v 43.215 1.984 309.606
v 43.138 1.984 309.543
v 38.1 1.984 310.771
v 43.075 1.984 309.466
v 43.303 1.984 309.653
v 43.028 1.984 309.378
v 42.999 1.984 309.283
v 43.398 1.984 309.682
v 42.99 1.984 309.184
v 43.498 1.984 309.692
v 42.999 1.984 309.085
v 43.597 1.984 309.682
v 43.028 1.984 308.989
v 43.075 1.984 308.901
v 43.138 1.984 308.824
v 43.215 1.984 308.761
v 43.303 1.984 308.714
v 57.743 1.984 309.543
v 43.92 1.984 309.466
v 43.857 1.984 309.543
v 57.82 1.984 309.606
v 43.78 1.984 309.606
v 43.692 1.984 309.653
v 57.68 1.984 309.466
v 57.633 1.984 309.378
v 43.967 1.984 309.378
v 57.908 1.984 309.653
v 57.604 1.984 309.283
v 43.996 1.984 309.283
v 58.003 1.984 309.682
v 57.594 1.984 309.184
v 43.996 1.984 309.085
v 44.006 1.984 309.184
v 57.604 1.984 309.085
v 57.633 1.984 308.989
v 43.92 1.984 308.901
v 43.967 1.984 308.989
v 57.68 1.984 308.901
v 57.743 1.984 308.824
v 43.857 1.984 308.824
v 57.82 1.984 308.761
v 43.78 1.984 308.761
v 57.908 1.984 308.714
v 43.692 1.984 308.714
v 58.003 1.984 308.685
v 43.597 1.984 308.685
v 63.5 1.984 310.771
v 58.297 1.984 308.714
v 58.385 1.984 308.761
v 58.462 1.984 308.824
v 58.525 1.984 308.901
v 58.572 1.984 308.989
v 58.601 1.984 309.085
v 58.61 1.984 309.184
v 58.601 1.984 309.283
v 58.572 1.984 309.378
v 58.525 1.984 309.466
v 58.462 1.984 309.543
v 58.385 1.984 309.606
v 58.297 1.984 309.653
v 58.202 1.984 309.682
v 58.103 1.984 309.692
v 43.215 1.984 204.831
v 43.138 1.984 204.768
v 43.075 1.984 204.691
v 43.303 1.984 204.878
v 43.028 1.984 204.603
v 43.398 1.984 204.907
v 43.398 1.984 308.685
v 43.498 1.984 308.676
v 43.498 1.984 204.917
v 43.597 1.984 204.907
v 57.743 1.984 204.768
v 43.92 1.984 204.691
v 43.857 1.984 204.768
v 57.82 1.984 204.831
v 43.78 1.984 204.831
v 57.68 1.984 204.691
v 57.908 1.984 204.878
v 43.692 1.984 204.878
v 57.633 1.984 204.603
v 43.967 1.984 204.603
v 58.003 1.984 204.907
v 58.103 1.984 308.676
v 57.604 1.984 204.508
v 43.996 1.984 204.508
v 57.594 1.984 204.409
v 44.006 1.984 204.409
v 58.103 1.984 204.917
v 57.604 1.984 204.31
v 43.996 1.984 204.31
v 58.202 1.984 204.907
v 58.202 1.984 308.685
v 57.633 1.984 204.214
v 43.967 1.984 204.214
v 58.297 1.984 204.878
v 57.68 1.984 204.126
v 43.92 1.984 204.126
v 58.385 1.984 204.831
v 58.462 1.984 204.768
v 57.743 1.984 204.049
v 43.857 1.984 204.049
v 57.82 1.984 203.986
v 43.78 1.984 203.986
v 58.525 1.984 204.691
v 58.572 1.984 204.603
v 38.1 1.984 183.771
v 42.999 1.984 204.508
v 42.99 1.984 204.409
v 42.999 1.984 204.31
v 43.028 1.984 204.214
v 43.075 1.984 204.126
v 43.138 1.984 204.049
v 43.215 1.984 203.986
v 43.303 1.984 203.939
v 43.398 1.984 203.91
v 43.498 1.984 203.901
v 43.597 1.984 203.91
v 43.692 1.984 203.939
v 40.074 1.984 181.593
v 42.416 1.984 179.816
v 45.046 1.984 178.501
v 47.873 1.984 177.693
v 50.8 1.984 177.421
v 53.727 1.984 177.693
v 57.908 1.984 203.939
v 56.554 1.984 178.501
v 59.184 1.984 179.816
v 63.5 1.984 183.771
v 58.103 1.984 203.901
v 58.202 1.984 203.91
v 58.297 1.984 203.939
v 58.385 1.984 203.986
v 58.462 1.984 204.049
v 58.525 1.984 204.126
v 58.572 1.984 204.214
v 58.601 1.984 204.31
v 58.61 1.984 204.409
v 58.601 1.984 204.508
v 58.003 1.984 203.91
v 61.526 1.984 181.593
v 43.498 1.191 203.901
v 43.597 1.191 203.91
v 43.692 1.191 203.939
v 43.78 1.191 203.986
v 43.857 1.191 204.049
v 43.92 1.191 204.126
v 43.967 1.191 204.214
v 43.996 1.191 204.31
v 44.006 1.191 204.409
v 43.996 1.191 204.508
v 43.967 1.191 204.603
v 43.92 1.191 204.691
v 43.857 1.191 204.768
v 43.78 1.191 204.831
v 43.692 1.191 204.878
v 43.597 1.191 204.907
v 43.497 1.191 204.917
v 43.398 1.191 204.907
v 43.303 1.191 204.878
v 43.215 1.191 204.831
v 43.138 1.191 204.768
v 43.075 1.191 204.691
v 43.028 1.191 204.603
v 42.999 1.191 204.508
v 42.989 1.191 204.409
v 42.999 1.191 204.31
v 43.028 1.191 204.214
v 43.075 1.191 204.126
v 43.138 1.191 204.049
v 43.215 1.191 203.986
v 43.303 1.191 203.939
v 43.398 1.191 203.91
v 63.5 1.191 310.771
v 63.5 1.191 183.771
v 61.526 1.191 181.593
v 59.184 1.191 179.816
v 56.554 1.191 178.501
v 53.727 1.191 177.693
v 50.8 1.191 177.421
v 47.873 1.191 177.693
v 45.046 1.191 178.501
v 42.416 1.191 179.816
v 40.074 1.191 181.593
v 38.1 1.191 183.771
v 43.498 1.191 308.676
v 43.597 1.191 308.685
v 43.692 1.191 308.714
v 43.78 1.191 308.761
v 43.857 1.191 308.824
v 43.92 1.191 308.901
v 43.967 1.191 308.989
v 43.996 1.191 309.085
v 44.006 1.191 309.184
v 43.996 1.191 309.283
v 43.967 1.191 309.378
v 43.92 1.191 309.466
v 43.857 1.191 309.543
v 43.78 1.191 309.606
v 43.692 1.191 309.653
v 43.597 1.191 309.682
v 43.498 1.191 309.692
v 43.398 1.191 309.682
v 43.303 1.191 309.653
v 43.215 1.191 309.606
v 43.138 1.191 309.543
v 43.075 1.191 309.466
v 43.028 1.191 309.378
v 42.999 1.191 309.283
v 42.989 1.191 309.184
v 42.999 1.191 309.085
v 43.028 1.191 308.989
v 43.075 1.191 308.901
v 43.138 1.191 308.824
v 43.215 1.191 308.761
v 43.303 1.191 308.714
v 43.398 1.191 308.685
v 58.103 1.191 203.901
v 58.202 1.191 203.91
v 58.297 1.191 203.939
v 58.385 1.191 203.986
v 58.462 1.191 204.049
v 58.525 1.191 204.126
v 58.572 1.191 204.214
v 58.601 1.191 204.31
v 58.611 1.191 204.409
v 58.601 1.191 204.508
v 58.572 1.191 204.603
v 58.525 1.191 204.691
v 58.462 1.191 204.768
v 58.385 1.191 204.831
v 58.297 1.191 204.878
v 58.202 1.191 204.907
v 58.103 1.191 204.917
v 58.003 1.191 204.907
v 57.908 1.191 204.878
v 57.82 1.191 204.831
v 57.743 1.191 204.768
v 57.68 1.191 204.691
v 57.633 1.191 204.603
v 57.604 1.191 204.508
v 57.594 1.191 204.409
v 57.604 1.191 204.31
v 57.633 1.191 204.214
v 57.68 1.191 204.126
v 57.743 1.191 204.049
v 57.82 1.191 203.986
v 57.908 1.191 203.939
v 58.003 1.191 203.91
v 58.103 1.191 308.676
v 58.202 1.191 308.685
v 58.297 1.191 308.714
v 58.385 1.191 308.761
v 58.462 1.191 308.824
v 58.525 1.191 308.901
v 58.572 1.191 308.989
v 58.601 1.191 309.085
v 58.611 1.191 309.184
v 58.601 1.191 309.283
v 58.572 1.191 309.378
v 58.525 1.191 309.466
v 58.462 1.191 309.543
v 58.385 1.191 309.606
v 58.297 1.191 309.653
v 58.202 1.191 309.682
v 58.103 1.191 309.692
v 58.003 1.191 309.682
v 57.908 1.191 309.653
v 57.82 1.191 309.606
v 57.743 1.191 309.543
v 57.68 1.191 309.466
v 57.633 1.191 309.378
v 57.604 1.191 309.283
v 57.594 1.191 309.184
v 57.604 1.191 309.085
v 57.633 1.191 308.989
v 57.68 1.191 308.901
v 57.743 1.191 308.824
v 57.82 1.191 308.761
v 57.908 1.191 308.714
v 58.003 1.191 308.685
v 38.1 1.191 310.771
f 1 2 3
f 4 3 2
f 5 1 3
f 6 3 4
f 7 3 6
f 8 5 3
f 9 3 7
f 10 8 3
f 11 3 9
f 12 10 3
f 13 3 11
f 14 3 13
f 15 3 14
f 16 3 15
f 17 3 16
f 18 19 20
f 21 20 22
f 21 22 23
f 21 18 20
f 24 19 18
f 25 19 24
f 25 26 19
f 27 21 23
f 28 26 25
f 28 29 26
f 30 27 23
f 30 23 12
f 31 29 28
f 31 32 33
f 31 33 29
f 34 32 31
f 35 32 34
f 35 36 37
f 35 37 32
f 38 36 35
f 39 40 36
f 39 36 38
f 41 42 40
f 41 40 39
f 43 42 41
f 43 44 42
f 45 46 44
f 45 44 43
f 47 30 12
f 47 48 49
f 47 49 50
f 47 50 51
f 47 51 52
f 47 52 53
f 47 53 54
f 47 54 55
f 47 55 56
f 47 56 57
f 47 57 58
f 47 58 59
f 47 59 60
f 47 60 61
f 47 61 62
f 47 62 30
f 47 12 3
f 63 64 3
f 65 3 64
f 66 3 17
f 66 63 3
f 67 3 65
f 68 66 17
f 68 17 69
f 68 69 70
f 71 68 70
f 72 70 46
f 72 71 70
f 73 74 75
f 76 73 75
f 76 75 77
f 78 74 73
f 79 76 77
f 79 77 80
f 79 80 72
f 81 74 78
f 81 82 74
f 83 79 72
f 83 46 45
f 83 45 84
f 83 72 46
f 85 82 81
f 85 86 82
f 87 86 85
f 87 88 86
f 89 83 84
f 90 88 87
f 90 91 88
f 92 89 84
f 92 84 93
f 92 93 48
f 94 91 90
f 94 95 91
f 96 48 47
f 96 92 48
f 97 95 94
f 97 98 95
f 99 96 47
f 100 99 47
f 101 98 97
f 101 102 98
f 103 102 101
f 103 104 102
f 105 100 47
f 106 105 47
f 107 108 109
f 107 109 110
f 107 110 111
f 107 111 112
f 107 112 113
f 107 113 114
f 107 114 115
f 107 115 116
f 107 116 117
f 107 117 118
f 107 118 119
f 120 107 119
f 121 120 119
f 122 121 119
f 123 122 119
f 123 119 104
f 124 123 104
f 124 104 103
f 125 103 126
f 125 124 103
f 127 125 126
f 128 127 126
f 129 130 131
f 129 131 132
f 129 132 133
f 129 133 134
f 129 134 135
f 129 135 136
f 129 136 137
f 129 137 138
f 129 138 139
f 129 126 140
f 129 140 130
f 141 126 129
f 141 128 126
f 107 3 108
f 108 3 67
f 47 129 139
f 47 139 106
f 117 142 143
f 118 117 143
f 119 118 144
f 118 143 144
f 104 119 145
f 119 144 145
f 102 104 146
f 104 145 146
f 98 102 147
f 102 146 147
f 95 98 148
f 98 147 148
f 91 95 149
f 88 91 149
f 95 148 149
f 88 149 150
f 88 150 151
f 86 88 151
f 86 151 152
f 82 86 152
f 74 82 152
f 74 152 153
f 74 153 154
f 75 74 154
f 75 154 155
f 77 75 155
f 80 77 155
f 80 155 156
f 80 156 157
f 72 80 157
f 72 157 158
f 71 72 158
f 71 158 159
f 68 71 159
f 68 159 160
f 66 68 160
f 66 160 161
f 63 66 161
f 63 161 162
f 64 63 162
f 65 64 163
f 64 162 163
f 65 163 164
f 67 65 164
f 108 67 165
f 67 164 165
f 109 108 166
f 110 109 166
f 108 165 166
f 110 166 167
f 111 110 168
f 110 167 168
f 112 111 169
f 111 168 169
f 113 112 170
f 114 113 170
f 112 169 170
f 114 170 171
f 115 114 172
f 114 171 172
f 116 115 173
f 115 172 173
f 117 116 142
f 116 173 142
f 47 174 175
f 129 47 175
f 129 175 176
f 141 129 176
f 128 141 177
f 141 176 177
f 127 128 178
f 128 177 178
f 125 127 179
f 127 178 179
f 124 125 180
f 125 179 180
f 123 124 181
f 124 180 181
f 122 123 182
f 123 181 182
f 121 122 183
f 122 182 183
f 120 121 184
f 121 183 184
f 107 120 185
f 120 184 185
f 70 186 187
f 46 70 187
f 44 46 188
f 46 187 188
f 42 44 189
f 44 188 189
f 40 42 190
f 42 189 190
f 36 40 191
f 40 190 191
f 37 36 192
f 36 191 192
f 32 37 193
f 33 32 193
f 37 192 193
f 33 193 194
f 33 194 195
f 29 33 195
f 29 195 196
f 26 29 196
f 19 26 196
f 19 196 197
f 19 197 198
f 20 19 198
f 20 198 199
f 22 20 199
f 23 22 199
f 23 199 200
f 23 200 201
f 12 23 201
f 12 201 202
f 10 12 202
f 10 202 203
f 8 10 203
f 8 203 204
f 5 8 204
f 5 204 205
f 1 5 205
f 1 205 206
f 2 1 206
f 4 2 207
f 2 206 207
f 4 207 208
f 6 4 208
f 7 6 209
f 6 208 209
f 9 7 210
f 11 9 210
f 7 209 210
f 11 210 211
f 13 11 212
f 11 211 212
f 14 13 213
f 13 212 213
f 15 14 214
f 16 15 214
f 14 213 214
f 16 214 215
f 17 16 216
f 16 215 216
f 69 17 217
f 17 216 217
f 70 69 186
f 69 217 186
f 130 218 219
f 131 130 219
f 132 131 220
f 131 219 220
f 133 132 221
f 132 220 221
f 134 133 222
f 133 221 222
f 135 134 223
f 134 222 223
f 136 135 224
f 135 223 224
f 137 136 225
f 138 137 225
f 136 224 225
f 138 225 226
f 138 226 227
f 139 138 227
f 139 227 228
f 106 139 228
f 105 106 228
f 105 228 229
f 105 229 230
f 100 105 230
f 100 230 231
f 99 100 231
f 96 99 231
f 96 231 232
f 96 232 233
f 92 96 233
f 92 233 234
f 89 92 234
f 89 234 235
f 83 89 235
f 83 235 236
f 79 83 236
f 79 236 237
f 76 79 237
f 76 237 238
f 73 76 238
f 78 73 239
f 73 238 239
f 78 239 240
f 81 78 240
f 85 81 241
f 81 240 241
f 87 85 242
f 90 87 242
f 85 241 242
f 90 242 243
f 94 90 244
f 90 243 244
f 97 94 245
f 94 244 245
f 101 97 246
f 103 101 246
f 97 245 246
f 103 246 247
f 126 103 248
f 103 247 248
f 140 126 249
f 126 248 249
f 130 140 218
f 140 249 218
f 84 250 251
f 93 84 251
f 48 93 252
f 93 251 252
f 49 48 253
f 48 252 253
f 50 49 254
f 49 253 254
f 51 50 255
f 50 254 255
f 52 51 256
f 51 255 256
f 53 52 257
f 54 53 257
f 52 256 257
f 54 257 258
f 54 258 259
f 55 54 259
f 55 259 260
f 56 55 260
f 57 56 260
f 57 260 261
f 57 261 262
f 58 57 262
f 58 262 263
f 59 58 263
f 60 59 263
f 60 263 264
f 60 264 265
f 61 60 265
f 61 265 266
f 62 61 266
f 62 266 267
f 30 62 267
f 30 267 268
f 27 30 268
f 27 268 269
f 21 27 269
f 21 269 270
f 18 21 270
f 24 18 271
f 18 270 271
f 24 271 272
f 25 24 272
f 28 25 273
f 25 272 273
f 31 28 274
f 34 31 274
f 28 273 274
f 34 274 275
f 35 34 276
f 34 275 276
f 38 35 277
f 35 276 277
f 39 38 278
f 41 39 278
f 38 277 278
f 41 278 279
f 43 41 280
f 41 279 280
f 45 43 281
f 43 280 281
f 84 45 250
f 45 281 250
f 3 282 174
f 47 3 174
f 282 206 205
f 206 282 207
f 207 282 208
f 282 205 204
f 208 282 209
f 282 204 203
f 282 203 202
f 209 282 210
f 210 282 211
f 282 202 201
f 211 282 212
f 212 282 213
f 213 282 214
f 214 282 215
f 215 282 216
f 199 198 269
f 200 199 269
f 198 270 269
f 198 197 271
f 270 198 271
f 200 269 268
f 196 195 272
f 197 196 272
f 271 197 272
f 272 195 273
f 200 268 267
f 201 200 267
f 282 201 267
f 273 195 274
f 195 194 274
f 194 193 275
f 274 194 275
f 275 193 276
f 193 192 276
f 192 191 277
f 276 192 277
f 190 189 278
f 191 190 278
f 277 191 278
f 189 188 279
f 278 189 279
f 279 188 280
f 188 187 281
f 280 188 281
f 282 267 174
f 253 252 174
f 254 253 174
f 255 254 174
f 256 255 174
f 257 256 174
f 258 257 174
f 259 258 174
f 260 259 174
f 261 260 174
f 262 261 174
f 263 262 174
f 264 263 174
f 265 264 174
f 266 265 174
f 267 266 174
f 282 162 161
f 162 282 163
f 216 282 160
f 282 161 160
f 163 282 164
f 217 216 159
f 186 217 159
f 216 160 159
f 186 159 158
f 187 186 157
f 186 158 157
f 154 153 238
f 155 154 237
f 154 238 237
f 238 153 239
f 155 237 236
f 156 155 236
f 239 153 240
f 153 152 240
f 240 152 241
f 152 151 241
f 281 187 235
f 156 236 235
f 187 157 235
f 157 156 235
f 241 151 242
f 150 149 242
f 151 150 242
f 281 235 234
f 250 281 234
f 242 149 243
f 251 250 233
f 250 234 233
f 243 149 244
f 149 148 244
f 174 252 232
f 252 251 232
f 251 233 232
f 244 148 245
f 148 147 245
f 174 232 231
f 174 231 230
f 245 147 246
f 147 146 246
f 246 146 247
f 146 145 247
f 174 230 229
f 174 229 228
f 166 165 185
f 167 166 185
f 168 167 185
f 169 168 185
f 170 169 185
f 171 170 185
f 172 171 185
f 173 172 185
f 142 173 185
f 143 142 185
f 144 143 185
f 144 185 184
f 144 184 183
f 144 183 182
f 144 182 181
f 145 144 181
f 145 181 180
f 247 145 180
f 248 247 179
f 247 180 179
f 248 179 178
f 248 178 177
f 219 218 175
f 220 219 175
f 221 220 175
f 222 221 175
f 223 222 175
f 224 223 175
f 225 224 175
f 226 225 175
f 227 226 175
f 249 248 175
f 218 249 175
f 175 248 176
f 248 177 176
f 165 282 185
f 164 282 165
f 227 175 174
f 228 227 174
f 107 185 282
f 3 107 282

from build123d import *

# Parameters (mm, degrees)
BOSS_EXTRUDE1_DEPTH = 3.175
SKETCH2_R           = 2.032
CUT_EXTRUDE1_DEPTH  = 519.070111689
SCALE1_SCALE        = 0.25


with BuildPart() as part:
    # Sketch1 → Boss-Extrude1 (new body)
    with BuildSketch(Plane(origin=(0, 0, 0), x_dir=(1, 0, 0), z_dir=(0, 1, 0))):
        with BuildLine():
            Line((0, 0), (0, -508))
            Line((0, -508), (101.6, -508))
            Line((101.6, -508), (101.6, 0))
            ThreePointArc((101.6, 0), (50.8, 25.4), (0, 0))
        make_face()
    extrude(amount=BOSS_EXTRUDE1_DEPTH)

    # Sketch2 → Cut-Extrude1 (cut, through all)
    with BuildSketch(Plane.XZ):
        with Locations(Location((21.59, 501.65, 0), (0, 0, 270))):
            Circle(SKETCH2_R)
        with Locations(Location((80.01, 501.65, 0), (0, 0, 270))):
            Circle(SKETCH2_R)
        with Locations(Location((21.59, 82.55, 0), (0, 0, 270))):
            Circle(SKETCH2_R)
        with Locations(Location((80.01, 82.55, 0), (0, 0, 270))):
            Circle(SKETCH2_R)
    extrude(amount=-CUT_EXTRUDE1_DEPTH, mode=Mode.SUBTRACT)


with BuildPart() as part_1:
    # Scale1: scaled about (50.8, 1.5875, 245.02824993)
    add(part.part.scale(SCALE1_SCALE).moved(Location((38.1, 1.190625, 183.771187447))))


solid = part_1.part
